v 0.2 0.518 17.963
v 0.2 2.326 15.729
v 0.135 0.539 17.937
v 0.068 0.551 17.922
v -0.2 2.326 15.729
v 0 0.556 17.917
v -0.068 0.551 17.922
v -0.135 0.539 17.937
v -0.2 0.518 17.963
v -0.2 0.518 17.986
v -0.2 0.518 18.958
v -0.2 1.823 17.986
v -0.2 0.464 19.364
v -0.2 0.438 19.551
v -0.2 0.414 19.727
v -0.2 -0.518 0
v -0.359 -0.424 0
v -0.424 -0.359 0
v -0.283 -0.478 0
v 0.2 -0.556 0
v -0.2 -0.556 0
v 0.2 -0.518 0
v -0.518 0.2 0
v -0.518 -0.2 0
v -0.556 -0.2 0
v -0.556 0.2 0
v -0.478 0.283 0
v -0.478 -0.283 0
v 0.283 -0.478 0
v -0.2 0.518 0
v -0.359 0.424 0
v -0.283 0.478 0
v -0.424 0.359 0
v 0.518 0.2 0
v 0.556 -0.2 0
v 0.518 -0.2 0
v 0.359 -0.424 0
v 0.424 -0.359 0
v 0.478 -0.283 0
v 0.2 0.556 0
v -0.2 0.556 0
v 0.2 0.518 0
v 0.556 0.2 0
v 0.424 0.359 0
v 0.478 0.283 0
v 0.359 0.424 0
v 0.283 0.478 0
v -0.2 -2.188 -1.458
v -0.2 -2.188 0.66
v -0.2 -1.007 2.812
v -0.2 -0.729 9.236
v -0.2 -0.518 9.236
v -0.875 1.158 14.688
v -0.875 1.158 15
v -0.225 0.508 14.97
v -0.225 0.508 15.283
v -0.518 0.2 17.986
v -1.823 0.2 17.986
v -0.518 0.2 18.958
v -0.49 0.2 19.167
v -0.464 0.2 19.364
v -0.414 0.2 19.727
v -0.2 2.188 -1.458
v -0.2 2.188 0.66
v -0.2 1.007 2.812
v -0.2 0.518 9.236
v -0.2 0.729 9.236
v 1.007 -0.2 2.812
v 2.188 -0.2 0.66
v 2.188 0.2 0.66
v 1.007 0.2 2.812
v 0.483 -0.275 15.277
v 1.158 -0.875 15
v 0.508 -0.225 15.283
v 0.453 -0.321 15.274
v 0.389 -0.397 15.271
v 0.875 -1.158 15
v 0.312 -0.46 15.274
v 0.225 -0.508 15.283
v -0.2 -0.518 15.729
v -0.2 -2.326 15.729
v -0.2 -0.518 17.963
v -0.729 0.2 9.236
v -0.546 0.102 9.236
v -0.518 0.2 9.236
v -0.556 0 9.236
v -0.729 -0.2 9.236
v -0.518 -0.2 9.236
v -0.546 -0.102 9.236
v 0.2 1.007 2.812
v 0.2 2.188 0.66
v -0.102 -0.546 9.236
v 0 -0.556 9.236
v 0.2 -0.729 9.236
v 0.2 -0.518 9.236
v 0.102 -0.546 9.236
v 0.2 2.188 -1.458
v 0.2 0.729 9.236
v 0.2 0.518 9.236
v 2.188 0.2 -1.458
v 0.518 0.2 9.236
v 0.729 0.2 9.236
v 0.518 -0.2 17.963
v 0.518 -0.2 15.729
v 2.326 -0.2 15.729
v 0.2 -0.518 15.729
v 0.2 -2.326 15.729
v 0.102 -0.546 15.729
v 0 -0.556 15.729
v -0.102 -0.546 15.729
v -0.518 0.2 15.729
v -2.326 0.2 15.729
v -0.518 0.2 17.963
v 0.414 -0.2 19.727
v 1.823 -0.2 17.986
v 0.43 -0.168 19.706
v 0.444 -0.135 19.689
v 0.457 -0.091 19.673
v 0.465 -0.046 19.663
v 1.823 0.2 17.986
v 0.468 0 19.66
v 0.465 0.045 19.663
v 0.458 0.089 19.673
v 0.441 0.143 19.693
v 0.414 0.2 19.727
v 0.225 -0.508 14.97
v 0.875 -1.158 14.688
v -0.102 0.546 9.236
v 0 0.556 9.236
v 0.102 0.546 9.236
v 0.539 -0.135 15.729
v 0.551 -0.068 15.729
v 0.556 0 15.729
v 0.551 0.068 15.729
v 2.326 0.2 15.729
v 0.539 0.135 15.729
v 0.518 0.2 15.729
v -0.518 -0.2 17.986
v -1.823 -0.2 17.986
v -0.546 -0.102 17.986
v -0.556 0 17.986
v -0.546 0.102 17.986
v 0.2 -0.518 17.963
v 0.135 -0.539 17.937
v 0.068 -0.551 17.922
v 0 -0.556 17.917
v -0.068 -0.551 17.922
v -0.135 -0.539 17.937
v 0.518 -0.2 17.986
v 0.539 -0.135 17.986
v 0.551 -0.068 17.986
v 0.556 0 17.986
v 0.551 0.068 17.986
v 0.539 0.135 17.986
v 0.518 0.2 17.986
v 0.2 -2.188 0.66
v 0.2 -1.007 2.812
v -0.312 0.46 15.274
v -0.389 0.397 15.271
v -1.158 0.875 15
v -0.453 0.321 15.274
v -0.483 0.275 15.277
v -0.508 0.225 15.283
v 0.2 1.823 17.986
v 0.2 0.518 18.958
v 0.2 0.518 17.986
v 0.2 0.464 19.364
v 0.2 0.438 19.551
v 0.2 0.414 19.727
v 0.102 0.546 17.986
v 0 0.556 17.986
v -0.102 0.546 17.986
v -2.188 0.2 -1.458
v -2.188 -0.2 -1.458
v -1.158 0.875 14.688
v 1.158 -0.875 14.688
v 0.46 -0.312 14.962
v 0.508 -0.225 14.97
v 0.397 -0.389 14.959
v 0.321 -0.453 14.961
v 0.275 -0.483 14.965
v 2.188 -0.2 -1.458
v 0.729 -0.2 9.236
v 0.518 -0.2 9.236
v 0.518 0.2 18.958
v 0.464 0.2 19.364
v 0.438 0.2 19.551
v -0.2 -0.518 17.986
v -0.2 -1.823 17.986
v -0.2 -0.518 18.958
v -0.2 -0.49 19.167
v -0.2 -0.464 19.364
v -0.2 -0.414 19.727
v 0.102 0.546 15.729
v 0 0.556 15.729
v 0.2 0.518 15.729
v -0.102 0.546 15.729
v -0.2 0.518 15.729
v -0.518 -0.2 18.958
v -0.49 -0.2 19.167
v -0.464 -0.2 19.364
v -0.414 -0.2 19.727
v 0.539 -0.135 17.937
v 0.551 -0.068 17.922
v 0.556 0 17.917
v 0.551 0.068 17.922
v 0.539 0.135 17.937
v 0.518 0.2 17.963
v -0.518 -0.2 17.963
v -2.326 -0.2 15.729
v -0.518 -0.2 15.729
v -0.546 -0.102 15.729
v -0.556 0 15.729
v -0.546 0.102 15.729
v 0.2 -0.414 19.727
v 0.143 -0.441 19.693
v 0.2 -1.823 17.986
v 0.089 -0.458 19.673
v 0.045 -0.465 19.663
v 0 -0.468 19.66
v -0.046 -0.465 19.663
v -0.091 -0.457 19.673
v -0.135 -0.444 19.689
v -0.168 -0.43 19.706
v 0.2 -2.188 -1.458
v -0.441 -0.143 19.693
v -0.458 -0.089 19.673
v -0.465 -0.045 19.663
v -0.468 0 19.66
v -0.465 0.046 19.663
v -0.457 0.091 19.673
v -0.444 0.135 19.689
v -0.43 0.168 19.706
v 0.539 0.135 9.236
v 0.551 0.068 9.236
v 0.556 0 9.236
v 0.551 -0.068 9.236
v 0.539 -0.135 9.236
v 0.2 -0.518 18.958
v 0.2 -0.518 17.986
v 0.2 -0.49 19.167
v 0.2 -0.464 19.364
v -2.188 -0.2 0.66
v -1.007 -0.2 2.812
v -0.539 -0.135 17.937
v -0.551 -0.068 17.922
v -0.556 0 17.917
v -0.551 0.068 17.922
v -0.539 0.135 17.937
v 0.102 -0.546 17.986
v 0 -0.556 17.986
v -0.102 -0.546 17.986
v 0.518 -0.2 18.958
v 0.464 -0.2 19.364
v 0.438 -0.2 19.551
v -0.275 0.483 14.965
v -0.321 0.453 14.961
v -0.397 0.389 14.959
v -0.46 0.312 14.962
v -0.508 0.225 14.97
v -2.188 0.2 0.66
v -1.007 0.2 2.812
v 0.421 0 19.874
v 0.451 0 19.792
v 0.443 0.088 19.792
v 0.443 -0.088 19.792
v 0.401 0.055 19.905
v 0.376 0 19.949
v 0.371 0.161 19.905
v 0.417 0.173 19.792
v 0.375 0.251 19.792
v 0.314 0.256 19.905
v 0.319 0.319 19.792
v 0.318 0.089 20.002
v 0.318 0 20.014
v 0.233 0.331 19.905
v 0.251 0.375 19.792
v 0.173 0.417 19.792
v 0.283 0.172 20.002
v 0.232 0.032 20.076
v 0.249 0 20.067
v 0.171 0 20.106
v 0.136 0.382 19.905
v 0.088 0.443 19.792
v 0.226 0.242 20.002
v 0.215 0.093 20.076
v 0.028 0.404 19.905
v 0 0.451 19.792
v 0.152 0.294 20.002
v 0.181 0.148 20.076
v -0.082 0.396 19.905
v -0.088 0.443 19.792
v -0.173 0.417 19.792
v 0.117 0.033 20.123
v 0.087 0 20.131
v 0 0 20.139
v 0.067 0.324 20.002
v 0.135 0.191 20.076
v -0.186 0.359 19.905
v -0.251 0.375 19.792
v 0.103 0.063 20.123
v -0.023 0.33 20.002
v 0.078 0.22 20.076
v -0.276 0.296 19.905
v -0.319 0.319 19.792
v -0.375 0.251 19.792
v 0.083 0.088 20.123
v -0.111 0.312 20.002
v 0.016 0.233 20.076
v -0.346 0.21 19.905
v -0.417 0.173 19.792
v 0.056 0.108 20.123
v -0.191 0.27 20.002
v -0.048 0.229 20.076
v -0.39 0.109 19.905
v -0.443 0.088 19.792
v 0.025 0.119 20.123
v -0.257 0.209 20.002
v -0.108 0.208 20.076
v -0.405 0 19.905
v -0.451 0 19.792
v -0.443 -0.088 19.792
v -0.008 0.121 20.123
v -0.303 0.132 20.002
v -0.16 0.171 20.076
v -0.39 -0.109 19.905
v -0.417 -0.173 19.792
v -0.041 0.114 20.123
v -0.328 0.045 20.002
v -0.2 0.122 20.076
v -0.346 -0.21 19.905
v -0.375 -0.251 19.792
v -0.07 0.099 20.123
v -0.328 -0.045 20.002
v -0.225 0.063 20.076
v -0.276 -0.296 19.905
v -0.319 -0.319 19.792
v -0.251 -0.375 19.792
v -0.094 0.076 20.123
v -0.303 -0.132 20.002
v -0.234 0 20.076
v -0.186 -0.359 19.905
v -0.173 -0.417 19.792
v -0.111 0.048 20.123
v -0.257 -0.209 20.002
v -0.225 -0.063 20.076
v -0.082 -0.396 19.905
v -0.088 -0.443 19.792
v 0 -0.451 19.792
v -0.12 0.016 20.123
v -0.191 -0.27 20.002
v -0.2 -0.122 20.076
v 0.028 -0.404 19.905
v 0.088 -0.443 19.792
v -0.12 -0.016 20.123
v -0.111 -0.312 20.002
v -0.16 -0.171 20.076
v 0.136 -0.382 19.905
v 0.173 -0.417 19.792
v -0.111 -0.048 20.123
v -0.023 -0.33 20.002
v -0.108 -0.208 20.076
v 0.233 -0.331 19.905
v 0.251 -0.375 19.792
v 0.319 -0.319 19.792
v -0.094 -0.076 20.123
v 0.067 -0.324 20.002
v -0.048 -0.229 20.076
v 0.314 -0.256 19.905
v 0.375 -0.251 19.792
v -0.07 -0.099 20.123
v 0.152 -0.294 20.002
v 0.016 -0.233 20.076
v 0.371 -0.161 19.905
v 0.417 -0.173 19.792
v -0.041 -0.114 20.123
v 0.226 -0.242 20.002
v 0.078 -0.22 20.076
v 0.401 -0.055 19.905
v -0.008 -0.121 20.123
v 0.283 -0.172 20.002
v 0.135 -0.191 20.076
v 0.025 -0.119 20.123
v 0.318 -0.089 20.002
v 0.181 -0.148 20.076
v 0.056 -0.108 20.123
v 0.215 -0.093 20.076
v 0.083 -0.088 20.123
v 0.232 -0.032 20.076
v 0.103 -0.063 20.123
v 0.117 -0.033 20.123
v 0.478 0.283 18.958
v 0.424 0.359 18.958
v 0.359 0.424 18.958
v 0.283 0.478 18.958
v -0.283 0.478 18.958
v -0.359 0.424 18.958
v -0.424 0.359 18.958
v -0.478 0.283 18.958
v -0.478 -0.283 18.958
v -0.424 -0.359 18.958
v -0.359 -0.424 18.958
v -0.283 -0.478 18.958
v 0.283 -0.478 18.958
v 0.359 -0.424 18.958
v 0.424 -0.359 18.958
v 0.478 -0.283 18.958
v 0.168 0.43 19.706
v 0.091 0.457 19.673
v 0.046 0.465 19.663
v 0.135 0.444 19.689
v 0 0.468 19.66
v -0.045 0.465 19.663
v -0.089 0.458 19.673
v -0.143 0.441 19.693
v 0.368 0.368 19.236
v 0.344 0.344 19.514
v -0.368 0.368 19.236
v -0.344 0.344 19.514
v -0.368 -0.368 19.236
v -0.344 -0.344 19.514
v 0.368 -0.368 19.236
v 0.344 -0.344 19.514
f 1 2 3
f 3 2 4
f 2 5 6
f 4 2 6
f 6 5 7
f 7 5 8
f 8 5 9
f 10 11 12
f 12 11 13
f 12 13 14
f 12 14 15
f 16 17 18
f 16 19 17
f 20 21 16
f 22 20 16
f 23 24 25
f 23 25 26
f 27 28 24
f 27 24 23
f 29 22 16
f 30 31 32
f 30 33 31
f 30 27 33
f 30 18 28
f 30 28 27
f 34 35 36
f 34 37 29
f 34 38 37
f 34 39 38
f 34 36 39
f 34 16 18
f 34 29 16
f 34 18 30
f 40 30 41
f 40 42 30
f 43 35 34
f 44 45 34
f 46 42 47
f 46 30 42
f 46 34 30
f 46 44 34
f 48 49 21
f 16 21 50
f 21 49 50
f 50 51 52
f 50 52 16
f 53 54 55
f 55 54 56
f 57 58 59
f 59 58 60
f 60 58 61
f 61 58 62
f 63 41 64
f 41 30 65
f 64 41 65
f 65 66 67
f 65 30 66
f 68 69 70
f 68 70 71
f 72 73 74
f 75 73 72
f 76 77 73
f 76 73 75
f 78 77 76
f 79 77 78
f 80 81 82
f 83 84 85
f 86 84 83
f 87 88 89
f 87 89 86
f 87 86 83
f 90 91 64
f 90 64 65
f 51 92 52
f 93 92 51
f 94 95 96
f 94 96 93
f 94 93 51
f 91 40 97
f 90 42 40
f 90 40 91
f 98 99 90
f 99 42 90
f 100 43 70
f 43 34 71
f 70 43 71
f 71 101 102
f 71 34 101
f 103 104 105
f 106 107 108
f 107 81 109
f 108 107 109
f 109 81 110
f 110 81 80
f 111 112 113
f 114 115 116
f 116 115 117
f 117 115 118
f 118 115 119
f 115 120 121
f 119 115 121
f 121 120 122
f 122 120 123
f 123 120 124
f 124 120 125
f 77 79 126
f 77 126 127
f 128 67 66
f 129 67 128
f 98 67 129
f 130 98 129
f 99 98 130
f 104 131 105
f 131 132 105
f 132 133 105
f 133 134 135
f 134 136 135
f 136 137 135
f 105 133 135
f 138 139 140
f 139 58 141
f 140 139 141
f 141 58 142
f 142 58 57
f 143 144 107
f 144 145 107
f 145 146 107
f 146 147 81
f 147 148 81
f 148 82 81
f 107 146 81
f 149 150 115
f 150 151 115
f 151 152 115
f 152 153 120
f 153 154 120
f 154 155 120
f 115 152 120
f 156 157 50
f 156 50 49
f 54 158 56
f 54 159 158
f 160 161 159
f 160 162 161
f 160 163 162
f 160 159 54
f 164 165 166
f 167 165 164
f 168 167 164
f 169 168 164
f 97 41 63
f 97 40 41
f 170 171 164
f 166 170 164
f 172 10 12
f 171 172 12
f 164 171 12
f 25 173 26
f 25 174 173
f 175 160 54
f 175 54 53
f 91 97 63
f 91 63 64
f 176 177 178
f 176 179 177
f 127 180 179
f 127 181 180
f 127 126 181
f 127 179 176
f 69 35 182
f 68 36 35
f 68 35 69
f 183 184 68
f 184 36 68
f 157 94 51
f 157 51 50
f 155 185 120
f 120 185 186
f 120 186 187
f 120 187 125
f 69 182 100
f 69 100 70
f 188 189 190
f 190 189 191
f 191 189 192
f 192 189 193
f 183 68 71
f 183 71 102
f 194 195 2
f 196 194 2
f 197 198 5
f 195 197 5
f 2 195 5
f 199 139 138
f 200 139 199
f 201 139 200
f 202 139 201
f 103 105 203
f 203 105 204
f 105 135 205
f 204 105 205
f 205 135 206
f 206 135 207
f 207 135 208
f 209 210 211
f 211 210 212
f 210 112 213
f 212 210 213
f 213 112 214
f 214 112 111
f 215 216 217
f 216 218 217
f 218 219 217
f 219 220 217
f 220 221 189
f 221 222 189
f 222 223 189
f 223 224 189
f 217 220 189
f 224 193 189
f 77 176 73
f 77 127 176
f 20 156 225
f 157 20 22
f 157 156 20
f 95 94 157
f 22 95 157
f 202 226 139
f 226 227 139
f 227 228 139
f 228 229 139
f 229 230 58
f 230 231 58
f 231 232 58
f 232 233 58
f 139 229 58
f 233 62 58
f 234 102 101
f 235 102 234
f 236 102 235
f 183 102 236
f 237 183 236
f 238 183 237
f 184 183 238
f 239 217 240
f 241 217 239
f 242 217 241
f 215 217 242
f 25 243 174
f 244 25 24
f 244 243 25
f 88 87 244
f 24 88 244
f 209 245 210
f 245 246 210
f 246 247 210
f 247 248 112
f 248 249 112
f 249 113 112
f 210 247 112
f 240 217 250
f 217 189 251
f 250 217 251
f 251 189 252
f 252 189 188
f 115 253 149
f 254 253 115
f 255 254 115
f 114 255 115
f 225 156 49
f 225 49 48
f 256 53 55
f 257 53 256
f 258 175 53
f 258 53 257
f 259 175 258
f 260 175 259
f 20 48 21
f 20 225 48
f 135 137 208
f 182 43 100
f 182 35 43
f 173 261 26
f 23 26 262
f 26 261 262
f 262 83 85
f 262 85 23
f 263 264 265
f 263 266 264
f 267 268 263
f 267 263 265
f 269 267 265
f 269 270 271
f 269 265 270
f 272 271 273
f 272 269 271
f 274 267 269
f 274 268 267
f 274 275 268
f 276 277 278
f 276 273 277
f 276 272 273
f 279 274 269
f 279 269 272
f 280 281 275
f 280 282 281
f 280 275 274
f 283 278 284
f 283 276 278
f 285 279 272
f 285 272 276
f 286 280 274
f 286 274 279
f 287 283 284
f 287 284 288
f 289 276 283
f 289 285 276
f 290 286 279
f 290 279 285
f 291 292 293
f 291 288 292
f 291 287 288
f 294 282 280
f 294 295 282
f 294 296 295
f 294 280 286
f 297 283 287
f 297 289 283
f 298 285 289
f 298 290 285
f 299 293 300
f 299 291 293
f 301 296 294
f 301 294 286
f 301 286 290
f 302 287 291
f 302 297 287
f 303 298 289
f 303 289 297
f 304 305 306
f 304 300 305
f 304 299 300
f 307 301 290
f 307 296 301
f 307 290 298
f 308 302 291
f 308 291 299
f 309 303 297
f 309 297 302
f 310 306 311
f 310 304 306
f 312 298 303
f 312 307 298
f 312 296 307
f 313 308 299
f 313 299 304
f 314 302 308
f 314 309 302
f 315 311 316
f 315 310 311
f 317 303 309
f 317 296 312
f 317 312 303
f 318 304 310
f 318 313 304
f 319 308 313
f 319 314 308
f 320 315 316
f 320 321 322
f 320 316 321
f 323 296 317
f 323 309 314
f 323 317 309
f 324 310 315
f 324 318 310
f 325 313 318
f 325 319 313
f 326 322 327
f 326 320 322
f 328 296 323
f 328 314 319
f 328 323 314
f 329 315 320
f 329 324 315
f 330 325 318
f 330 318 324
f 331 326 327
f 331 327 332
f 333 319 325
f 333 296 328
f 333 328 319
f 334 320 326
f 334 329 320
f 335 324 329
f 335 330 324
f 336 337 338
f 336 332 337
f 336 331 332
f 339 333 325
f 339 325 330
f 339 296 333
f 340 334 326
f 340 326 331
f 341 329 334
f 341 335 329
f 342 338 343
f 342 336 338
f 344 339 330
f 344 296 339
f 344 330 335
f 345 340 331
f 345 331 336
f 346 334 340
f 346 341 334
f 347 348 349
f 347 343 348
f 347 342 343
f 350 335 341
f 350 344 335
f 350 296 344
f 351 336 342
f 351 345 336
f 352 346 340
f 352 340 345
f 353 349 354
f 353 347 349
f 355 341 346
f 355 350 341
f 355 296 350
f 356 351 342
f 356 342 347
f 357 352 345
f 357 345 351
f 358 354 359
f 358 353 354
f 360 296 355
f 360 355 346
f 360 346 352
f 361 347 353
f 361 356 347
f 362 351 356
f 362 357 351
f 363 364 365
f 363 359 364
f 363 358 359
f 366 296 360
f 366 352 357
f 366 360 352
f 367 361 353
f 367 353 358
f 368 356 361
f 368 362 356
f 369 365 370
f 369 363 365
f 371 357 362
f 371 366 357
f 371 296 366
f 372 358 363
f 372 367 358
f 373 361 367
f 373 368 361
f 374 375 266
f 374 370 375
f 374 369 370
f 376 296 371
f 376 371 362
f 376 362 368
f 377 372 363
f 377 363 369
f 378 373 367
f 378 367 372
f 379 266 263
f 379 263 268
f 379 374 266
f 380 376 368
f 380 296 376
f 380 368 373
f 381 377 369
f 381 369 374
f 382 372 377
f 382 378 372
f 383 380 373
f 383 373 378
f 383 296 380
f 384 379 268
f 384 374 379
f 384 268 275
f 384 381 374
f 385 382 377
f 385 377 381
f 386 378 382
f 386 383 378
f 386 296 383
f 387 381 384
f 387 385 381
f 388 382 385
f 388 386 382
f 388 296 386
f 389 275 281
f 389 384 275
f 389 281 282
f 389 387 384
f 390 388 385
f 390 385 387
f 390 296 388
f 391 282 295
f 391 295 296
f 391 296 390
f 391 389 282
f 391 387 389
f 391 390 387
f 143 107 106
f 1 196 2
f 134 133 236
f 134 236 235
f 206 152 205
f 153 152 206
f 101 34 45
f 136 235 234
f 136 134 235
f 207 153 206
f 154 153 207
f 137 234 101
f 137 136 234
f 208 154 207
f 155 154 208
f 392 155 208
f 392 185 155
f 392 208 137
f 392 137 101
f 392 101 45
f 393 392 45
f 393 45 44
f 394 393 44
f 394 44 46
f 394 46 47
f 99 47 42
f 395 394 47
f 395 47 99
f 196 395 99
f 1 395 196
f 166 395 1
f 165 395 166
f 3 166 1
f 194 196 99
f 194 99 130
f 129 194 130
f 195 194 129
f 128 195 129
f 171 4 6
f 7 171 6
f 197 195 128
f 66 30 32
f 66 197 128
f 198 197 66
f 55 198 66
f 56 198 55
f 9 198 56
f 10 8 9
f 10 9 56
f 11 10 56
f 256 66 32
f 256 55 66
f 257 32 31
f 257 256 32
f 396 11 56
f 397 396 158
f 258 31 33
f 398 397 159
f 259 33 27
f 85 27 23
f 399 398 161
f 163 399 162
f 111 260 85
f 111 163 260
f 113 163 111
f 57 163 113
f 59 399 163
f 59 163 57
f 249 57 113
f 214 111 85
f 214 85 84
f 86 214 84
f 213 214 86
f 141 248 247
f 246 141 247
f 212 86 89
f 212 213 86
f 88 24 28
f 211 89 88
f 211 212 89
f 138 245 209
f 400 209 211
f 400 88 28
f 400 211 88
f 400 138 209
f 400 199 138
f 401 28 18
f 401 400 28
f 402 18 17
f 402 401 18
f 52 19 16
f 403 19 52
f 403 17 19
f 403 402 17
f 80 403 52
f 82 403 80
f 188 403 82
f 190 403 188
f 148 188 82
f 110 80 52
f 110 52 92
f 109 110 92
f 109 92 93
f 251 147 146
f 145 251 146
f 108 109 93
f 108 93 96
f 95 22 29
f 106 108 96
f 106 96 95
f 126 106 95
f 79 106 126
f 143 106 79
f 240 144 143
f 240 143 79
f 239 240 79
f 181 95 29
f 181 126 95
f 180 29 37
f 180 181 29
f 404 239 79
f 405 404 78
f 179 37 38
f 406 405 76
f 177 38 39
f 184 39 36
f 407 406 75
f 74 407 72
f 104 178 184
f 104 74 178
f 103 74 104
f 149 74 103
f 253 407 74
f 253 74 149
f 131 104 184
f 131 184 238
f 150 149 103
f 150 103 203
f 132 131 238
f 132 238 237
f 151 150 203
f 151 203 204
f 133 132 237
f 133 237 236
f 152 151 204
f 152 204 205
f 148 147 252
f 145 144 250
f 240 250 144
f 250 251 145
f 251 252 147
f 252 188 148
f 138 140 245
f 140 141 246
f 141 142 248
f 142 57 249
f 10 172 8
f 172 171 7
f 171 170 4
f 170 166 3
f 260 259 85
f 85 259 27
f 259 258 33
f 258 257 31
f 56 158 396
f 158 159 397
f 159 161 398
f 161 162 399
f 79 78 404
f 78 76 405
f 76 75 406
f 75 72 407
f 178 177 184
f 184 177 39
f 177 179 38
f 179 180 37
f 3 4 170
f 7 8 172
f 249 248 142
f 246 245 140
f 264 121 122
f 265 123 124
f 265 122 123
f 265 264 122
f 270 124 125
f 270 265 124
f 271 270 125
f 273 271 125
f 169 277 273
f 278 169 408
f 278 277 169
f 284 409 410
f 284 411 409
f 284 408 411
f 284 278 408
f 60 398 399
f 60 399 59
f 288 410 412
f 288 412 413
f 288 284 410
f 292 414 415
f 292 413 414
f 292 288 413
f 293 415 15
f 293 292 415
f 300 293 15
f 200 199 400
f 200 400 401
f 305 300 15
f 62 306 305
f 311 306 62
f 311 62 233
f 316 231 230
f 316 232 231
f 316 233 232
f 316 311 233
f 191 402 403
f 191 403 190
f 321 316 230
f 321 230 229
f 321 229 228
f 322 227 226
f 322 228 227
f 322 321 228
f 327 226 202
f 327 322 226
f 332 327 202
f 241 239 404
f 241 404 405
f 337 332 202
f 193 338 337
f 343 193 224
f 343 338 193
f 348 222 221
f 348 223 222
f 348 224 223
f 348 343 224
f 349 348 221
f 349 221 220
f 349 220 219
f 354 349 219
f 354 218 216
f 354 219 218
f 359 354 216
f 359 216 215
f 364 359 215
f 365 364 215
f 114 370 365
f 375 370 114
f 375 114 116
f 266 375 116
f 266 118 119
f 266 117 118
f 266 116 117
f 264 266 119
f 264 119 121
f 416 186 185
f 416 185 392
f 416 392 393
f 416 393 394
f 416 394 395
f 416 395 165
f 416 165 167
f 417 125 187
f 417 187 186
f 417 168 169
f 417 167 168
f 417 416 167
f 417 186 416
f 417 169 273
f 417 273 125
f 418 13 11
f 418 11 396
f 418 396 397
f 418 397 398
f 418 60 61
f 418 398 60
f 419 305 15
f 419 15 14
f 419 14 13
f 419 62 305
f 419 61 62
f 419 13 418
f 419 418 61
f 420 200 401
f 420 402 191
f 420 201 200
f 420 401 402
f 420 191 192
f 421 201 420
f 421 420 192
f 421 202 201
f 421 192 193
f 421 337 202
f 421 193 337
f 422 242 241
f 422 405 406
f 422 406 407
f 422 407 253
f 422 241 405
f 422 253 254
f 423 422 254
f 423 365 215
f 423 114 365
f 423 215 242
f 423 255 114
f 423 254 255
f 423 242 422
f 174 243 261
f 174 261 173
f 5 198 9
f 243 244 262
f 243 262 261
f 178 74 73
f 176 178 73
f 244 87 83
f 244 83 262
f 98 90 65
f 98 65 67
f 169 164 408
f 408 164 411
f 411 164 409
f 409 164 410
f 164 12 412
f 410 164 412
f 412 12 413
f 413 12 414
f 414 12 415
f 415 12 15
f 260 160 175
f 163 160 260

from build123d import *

# Parameters (mm, degrees)
F3_DEPTH = 0.2
F4_COUNT = 4
F7_DEPTH = 0.2


with BuildPart() as f1:
    # F0 (on Front) → F1 (revolve)
    with BuildSketch(Plane.XZ):
        with BuildLine():
            Line((0, 20.1388888889), (0, 0))
            Line((0, 0), (0.5555555556, 0))
            Line((0.5555555556, 0), (0.5555555556, 18.9583333333))
            Line((0.5555555556, 18.9583333333), (0.4513888889, 19.7916666667))
            ThreePointArc((0.4513888889, 19.7916666667), (0.2847433935, 20.0420414116), (0, 20.1388888889))
        make_face()
    revolve(axis=Axis((0, 0, 10.0694444444), (0, 0, 1)))

    # F2 (on Front) → F3 (join, symmetric)
    with BuildSketch(Plane.XZ):
        Polygon((0.2263558201, 19.9583333333), (-0.2263558201, 19.9583333333), (-1.8229166667, 17.9861111111), (-0.4993386243, 17.9861111111), (-2.3263888889, 15.7291666667), (2.3263888889, 15.7291666667), (0.4993386243, 17.9861111111), (1.8229166667, 17.9861111111), align=None)
        Polygon((0.5361597759, 0.0173323988), (0.5555555556, 0), (2.1875, -1.4583333333), (2.1875, 0.6597222222), (1.0069444444, 2.8125), (0.7291666667, 9.2361111111), (-0.7291666667, 9.2361111111), (-1.0069444444, 2.8125), (-2.1875, 0.6597222222), (-2.1875, -1.4583333333), (-0.5555555556, 0), (-0.5361597759, 0.0173323988), align=None)
        Polygon((-0.5555555556, 0), (0.5555555556, 0), (0.5361597759, 0.0173323988), (-0.5361597759, 0.0173323988), align=None)
    extrude(amount=F3_DEPTH, both=True)


with BuildPart() as f4_1:
    # F4: instance of F1
    add(f1.part.rotate(Axis((0, 0, 0), (0, 0, 1)), 1 * 360 / F4_COUNT))


with BuildPart() as f4_2:
    # F4: instance of F1
    add(f1.part.rotate(Axis((0, 0, 0), (0, 0, 1)), 2 * 360 / F4_COUNT))


with BuildPart() as f4_3:
    # F4: instance of F1
    add(f1.part.rotate(Axis((0, 0, 0), (0, 0, 1)), 3 * 360 / F4_COUNT))


with BuildPart() as f1_1:
    add(f1.part)

    add(f4_1.part)  # F7 merges F4_1

    add(f4_2.part)  # F7 merges F4_2

    add(f4_3.part)  # F7 merges F4_3
    # F6 (on face) → F7 (join, symmetric)
    with BuildSketch(Plane(origin=(0, 0, 0), x_dir=(0.7071067812, -0.7071067812, 0), z_dir=(-0.7071067812, -0.7071067812, 0))):
        Polygon((0.25, 15.3652419184), (-0.25, 15.3652419184), (-1.4370362347, 15), (-1.4370362347, 14.6875), (-0.25, 15.0527419184), (0.25, 15.0527419184), (1.4370362347, 14.6875), (1.4370362347, 15), align=None)
    extrude(amount=F7_DEPTH, both=True)


solid = f1_1.part
